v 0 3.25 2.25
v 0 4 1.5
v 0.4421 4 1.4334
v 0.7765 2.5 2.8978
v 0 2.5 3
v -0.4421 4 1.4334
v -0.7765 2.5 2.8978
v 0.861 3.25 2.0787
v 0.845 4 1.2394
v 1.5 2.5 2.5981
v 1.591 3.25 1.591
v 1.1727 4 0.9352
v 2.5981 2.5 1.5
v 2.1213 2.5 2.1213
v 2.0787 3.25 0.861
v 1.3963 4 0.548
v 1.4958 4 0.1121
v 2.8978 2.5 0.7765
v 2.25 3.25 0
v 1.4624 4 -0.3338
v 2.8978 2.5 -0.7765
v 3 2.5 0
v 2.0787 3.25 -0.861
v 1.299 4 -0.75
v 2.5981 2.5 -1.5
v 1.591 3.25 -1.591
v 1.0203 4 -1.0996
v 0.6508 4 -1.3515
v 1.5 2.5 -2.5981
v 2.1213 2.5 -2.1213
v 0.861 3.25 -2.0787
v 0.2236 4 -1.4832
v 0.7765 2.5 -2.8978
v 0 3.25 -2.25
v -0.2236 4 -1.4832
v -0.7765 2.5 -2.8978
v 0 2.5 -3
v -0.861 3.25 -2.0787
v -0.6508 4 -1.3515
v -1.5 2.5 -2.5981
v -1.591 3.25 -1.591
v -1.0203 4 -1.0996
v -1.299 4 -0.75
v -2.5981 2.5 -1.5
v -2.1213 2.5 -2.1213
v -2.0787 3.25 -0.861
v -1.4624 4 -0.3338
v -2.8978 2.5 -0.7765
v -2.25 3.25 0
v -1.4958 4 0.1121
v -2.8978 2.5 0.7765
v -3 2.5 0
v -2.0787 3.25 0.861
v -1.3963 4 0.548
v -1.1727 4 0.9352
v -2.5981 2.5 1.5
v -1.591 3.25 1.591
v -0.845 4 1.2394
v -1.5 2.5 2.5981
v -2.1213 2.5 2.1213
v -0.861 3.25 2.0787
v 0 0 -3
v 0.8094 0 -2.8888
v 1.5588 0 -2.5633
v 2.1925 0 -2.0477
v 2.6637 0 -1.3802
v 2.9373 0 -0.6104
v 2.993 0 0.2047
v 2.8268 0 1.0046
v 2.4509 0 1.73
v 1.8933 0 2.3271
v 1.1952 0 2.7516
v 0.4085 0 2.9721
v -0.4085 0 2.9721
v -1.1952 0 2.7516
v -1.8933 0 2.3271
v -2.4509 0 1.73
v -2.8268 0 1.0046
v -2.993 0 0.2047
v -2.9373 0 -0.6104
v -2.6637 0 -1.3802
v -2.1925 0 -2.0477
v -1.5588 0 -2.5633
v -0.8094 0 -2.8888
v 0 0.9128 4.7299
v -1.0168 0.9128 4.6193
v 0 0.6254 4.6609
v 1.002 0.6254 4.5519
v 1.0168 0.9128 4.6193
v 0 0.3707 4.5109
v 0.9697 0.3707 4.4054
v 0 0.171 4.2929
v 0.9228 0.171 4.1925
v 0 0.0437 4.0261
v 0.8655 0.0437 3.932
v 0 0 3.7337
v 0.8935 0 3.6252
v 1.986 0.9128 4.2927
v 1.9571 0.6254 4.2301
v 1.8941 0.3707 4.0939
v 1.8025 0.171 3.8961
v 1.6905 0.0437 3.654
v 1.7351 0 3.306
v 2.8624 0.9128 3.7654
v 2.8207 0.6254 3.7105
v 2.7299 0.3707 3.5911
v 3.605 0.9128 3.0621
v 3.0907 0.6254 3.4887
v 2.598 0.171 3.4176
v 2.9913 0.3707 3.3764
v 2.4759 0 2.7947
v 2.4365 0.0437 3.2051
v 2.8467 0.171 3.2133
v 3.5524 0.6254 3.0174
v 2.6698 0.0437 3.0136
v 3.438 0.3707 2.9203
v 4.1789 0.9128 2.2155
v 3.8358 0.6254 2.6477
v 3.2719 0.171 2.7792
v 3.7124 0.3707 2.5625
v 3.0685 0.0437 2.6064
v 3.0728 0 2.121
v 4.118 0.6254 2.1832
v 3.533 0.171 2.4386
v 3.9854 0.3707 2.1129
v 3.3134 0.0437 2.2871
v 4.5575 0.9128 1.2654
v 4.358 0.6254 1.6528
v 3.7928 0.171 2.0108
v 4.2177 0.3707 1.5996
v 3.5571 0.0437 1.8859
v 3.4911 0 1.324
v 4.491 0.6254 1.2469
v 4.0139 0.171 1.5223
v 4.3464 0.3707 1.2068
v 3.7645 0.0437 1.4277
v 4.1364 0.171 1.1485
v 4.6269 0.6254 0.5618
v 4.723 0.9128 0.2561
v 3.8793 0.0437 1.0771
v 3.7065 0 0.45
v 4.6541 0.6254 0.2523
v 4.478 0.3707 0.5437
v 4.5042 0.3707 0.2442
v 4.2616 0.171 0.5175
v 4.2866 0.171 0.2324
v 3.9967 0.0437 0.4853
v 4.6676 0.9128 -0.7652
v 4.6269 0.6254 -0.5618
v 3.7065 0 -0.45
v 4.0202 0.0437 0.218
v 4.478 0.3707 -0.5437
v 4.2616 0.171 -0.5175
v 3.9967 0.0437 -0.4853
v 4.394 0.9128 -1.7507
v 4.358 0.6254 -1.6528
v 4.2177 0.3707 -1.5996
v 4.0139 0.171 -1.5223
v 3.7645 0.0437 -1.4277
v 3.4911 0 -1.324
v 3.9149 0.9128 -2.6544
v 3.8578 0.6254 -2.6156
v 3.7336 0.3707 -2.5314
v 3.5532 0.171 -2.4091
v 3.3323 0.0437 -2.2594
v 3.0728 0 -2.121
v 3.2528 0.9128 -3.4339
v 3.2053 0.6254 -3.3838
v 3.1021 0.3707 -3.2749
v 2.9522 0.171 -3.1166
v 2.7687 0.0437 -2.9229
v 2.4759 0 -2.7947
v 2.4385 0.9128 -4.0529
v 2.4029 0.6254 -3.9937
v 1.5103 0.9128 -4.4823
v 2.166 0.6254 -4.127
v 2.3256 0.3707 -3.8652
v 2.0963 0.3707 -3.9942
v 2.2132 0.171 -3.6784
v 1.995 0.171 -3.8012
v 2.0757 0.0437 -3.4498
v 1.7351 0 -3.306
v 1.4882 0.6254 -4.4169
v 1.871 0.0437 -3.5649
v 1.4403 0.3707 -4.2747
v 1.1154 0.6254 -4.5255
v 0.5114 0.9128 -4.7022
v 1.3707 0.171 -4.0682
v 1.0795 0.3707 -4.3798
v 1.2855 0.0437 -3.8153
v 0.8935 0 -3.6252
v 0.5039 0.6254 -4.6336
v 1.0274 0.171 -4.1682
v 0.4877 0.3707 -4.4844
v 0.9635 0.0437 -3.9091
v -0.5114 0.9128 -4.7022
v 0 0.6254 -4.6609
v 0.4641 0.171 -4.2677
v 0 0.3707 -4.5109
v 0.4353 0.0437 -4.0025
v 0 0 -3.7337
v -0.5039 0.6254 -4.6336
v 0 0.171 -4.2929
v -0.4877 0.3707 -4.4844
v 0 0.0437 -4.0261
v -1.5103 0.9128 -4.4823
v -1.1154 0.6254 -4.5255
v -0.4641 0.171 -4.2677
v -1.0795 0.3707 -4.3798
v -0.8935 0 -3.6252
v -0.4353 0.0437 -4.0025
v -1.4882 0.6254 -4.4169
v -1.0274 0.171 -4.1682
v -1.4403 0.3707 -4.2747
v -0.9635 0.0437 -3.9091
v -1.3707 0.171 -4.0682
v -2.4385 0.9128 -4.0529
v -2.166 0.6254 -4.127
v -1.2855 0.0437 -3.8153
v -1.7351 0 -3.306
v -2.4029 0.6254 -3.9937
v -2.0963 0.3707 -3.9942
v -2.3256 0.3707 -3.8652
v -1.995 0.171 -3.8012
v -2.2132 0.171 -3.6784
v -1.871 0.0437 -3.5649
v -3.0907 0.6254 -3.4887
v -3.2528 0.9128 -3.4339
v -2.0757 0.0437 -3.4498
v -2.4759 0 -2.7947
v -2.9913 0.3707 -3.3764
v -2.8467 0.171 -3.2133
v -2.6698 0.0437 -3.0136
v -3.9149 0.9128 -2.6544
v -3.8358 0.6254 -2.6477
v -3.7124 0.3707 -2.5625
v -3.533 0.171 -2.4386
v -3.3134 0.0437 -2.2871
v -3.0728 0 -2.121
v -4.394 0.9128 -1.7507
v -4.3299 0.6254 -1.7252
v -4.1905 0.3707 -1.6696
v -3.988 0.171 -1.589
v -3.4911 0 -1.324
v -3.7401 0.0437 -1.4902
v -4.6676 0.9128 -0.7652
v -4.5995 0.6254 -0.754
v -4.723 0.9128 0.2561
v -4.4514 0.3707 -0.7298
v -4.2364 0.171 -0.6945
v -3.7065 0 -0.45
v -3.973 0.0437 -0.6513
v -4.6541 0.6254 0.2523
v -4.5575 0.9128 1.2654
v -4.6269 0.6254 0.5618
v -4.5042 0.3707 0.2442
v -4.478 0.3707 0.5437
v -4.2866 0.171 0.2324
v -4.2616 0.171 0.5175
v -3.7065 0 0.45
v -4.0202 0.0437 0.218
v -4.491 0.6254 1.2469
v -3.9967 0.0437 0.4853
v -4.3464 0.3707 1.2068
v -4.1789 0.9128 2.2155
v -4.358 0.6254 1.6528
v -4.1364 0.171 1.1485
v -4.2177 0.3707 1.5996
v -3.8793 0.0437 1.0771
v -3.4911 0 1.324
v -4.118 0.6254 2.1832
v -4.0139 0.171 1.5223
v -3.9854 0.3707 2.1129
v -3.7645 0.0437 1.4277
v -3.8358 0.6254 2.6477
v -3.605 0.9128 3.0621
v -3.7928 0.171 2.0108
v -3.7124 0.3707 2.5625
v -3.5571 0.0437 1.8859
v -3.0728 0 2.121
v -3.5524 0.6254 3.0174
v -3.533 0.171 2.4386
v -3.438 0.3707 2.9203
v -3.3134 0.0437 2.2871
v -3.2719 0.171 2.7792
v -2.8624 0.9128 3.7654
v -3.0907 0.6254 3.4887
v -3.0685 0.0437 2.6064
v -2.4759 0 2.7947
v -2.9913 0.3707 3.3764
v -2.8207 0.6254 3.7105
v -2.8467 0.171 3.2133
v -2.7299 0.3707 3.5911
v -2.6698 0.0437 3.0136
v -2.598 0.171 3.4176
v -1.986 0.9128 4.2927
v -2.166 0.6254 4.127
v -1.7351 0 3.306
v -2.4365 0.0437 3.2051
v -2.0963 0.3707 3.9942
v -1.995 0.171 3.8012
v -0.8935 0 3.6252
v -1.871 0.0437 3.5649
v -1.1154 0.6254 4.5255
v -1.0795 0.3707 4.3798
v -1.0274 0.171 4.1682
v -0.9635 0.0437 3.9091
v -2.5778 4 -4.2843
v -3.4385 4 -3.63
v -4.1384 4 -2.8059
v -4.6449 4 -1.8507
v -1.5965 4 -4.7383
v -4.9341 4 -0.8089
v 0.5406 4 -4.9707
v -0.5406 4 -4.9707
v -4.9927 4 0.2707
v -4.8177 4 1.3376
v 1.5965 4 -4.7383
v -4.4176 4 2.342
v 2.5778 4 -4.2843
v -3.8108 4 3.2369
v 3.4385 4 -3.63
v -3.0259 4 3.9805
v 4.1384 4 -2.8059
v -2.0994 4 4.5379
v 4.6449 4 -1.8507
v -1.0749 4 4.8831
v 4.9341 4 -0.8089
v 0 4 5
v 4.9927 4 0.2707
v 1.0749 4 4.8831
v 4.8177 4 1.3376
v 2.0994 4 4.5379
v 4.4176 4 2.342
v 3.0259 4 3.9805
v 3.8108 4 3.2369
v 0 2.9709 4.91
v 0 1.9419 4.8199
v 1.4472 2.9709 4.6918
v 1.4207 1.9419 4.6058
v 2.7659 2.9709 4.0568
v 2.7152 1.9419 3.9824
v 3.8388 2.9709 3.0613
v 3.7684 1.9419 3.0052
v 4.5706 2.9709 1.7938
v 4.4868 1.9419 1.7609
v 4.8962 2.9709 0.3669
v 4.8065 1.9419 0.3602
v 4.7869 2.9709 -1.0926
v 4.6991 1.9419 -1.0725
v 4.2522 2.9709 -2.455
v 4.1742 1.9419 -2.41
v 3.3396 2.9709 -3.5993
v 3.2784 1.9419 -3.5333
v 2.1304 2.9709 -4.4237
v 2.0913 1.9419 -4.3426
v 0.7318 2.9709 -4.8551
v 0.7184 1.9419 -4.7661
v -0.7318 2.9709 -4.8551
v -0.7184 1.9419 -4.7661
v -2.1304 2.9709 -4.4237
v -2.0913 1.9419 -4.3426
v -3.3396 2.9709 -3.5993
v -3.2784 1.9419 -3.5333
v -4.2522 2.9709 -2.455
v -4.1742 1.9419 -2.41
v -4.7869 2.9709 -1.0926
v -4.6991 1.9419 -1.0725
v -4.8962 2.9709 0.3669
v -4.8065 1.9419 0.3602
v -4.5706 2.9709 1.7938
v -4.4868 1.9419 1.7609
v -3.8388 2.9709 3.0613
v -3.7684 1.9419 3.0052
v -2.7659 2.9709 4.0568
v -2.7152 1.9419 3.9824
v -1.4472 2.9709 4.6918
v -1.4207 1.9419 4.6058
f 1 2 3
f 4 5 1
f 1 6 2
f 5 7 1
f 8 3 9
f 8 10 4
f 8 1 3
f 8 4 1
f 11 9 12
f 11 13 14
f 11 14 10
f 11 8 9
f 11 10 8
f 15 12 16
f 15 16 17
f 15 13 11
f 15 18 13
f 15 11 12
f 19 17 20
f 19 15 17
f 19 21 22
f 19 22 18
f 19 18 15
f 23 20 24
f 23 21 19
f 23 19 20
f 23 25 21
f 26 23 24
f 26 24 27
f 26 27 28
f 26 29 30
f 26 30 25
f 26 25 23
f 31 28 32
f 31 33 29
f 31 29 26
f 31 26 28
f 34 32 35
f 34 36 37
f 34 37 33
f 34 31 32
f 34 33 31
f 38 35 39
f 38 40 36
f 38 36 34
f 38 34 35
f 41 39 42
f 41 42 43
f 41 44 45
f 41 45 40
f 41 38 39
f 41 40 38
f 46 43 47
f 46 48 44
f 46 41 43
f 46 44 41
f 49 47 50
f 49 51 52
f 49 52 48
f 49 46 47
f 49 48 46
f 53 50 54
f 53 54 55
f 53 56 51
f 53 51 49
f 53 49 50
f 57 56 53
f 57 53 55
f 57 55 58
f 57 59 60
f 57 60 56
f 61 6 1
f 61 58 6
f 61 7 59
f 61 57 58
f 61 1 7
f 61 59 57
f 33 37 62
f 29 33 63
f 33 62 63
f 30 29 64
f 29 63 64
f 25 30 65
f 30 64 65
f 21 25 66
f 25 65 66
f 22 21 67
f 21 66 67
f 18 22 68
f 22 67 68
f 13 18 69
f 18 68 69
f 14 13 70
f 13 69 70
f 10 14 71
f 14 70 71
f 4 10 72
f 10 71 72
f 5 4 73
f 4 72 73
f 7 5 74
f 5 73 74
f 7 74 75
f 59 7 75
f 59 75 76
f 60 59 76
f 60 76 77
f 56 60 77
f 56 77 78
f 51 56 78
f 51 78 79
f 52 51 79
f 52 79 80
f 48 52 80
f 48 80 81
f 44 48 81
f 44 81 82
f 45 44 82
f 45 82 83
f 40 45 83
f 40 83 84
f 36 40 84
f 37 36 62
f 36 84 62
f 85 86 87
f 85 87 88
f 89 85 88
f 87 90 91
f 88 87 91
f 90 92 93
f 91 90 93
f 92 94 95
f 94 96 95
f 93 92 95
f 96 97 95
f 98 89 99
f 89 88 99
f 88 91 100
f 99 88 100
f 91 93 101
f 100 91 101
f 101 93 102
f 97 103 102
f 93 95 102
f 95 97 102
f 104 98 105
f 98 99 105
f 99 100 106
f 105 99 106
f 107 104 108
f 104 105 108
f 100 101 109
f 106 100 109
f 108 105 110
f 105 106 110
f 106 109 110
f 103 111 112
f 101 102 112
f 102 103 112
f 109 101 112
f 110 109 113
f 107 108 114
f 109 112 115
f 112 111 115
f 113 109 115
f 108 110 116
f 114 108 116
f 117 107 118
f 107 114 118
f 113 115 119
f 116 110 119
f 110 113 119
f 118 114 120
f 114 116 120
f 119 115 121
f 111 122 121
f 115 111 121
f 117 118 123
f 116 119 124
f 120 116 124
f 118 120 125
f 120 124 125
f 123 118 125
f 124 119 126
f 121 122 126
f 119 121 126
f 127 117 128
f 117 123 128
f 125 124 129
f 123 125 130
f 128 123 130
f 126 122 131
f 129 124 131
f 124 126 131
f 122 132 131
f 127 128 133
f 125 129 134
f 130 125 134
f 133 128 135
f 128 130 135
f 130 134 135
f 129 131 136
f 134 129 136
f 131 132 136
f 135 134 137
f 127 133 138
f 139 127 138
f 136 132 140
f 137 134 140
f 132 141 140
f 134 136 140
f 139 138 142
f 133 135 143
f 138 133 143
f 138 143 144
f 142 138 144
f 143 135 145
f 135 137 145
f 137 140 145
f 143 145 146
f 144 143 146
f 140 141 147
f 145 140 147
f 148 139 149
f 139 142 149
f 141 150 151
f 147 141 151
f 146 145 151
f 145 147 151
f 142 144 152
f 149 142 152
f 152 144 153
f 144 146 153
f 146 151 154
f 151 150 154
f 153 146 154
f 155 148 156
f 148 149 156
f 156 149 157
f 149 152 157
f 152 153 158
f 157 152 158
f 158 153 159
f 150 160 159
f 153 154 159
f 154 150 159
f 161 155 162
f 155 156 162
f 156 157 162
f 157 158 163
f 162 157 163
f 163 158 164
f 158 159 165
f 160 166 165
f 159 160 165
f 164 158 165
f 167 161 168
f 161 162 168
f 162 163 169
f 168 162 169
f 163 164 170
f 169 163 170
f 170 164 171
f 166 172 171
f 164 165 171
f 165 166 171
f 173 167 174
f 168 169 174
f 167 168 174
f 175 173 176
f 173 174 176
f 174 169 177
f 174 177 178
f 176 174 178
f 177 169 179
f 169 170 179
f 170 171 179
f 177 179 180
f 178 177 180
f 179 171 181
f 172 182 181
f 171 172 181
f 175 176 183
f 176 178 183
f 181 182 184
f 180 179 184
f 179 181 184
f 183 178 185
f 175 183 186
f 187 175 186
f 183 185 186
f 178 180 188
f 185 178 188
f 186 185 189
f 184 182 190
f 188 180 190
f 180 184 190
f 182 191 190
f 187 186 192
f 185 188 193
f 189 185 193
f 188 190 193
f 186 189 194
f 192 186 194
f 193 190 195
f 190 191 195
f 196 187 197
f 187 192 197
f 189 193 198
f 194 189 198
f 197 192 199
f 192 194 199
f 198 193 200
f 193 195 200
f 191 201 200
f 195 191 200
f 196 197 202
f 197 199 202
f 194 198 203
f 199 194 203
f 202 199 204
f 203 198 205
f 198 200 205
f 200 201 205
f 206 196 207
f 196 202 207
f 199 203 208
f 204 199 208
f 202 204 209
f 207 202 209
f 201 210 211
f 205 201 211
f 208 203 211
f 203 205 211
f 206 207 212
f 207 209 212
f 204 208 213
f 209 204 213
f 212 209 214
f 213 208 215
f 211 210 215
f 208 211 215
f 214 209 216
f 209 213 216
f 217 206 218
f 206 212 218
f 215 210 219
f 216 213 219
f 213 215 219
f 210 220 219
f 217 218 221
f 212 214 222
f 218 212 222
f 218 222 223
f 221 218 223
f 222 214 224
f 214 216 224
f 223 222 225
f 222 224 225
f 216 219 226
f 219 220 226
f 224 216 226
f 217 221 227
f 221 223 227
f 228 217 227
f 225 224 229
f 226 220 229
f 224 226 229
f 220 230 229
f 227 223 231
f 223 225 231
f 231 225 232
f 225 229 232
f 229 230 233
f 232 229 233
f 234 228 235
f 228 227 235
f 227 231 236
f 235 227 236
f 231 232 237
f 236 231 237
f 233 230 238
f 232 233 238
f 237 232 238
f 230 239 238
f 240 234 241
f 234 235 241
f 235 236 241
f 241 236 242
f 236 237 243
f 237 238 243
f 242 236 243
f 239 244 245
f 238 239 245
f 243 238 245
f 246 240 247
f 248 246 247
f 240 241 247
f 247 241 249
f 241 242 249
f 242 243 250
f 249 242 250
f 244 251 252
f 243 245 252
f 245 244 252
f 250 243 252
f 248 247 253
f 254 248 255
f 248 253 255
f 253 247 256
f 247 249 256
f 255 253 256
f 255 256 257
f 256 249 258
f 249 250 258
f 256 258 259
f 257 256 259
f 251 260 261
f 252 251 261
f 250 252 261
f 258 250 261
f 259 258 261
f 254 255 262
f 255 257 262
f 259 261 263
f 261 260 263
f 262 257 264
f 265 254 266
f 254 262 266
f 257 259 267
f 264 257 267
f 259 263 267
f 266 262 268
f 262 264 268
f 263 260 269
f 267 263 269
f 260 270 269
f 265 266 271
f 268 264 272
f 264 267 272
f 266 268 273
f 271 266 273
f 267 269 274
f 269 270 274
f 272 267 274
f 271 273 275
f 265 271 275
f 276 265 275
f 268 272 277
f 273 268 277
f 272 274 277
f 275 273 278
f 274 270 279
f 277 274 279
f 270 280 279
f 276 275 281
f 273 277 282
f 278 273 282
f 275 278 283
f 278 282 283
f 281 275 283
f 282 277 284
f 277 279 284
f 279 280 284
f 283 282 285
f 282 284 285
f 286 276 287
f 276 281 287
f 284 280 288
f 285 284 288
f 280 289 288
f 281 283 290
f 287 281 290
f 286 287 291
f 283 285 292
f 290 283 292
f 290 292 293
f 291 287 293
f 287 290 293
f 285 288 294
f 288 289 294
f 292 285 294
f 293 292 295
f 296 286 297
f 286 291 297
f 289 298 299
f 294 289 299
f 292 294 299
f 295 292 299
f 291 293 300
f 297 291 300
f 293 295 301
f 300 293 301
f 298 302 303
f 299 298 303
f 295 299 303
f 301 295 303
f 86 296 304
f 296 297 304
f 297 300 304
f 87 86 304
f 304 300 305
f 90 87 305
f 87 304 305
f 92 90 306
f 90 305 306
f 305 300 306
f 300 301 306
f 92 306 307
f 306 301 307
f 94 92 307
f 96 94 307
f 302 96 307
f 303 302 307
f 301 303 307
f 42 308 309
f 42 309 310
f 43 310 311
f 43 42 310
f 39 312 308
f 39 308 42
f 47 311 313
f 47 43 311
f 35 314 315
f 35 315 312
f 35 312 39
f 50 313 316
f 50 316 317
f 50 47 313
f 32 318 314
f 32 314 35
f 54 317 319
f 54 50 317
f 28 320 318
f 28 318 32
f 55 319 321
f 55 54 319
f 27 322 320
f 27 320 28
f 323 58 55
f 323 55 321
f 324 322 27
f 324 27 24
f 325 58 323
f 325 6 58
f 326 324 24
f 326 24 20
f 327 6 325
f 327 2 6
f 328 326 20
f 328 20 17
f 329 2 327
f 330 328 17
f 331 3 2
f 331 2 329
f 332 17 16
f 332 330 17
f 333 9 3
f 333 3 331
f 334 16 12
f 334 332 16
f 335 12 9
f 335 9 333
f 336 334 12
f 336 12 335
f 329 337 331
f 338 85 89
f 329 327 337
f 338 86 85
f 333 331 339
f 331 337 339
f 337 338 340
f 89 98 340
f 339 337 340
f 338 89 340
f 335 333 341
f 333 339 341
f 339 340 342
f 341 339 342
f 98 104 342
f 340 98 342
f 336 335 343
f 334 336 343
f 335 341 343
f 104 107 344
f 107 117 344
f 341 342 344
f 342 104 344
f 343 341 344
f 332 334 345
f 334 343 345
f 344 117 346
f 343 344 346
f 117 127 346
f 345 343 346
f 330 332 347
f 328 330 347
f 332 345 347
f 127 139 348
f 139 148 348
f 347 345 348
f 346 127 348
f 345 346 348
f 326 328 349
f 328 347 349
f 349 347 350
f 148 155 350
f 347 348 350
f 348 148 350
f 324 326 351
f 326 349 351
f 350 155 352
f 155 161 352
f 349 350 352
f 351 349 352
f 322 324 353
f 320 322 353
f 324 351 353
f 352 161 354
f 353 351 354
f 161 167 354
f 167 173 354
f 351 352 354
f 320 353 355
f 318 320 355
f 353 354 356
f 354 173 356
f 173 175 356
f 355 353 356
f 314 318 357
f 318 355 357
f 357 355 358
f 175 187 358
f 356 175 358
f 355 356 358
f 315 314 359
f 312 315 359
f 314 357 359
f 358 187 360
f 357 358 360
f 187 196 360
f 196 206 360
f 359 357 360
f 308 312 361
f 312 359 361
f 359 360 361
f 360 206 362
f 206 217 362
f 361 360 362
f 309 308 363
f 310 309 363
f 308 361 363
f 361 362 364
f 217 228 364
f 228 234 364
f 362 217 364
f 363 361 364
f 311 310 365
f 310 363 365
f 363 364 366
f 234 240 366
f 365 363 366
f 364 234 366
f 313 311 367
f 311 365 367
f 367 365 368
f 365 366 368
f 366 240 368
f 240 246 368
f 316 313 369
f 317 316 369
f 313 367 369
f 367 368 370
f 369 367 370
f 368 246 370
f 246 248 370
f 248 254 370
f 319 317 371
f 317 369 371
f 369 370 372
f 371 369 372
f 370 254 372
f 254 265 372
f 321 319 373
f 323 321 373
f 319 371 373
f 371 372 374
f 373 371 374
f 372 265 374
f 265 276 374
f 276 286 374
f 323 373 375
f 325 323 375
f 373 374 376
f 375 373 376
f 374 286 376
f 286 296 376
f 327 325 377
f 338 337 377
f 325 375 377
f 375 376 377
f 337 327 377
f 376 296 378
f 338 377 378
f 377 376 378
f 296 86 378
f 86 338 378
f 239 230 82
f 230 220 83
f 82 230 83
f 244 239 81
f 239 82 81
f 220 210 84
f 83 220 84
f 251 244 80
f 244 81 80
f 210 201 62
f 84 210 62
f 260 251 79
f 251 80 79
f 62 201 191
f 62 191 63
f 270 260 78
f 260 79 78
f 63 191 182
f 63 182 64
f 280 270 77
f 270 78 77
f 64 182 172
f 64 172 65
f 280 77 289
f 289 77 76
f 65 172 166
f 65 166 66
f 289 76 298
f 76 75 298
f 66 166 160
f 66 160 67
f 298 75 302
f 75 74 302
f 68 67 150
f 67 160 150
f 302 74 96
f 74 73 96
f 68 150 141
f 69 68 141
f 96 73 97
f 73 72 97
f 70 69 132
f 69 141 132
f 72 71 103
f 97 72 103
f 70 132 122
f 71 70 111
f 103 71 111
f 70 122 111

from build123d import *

# Parameters (mm, degrees)
SKETCH_1_R          = 5
EXTRUDE_1_DEPTH     = 4
SKETCH_2_R          = 1.5
CUT_EXTRUDE_1_DEPTH = 5
DRAFT_1_ANGLE       = -1
DRAFT_4_ANGLE       = -5
SKETCH_3_R          = 3
CUT_EXTRUDE_2_DEPTH = 2
FILLET_1_R          = 1
CHAMFER_1_SIZE      = 2


with BuildPart() as part:
    # Эскиз1 → Бобышка-Вытянуть1 (new body)
    with BuildSketch(Plane(origin=(0, 0, 0), x_dir=(1, 0, 0), z_dir=(0, 1, 0))):
        with Locations(Location((0, 0, 0), (0, 0, 270))):
            Circle(SKETCH_1_R)
    extrude(amount=EXTRUDE_1_DEPTH)

    # Эскиз2 → Вырез-Вытянуть1 (cut)
    with BuildSketch(Plane(origin=(0, 4, 0), x_dir=(1, 0, 0), z_dir=(0, 1, 0))):
        with Locations(Location((0, 0, 0), (0, 0, 270))):
            Circle(SKETCH_2_R)
    extrude(amount=-CUT_EXTRUDE_1_DEPTH, mode=Mode.SUBTRACT)

    # Уклон1
    draft_1_faces = [part.faces().sort_by_distance(p)[0] for p in [
        (0, 2, -5),
    ]]
    draft(draft_1_faces, Plane.ZX.offset(4), DRAFT_1_ANGLE)

    # Уклон4
    draft_4_faces = [part.faces().sort_by_distance(p)[0] for p in [
        (0, 2, -4.96508987),
    ]]
    draft(draft_4_faces, Plane.ZX.offset(4), DRAFT_4_ANGLE)

    # Эскиз3 → Вырез-Вытянуть2 (cut)
    with BuildSketch(Plane.XZ):
        with Locations(Location((0, 0, 0), (0, 0, 270))):
            Circle(SKETCH_3_R)
    extrude(amount=-CUT_EXTRUDE_2_DEPTH, mode=Mode.SUBTRACT)

    # Скругление1
    fillet_1_edges = [part.edges().sort_by_distance(p)[0] for p in [
        (0, 0, -4.650045346),
    ]]
    fillet(fillet_1_edges, radius=FILLET_1_R)

    # Фаска1
    # the kernel refuses this chamfer: 2 mm, written as the material it takes off along each edge
    with BuildSketch(Plane(origin=(0, 2, 0), x_dir=(0, 0, 1), z_dir=(-1, 0, 0))) as chamfer_1_piece_1_section:
        Polygon((1.5, CHAMFER_1_SIZE), (1.5 + CHAMFER_1_SIZE, 0), (1.5, 0), align=None)
    chamfer_1_piece_1 = revolve(axis=Axis((0, 2, 0), (0, 1, 0)), mode=Mode.PRIVATE)
    chamfer_1_piece_1 = chamfer_1_piece_1 & Plane(origin=(0, 3.257194568, 0), x_dir=(0, 0, -1), z_dir=(0, -1, 0)) * Cylinder(3, 14, mode=Mode.PRIVATE)
    add(chamfer_1_piece_1, mode=Mode.SUBTRACT)


solid = part.part
